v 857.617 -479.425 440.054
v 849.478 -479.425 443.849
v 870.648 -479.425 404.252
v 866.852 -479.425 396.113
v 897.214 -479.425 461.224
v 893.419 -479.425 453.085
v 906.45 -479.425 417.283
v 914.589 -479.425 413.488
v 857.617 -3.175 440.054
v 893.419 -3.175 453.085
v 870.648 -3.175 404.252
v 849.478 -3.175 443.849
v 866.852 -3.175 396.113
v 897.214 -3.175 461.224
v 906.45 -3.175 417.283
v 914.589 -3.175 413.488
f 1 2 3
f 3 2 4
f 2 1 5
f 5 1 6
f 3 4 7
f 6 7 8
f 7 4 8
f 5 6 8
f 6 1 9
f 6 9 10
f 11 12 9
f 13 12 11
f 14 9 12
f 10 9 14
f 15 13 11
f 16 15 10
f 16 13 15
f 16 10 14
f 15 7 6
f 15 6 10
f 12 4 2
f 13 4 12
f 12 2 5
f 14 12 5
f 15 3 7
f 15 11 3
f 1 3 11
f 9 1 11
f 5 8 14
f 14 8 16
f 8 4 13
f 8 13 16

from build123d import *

# Parameters (mm, degrees)
BOX_W           = 50.8
BOX_H           = 476.25
BOX_DEPTH       = 50.8
BOX_PITCH_ANGLE = -20
THICKNESS_T     = -6.35


with BuildPart() as part:
    # Box → Box (new body)
    with BuildSketch(Plane.XY):
        with Locations((25.4, 238.125)):
            Rectangle(BOX_W, BOX_H)
    extrude(amount=BOX_DEPTH)


with BuildPart() as part_1:
    # Box pitch: moved
    add(part.part.rotate(Axis((0, 0, 0), (0, 1, 0)), BOX_PITCH_ANGLE))


with BuildPart() as part_2:
    # Box placement: moved
    add(part_1.part.moved(Location((866.852281, -479.425, 396.112887))))

    # Thickness
    thickness_openings = [part_2.faces().sort_by_distance(p)[0] for p in [
        (882.033162, -479.425, 428.668391),
        (882.033162, -3.175, 428.668391),
    ]]
    offset(amount=THICKNESS_T, openings=thickness_openings)


solid = part_2.part
